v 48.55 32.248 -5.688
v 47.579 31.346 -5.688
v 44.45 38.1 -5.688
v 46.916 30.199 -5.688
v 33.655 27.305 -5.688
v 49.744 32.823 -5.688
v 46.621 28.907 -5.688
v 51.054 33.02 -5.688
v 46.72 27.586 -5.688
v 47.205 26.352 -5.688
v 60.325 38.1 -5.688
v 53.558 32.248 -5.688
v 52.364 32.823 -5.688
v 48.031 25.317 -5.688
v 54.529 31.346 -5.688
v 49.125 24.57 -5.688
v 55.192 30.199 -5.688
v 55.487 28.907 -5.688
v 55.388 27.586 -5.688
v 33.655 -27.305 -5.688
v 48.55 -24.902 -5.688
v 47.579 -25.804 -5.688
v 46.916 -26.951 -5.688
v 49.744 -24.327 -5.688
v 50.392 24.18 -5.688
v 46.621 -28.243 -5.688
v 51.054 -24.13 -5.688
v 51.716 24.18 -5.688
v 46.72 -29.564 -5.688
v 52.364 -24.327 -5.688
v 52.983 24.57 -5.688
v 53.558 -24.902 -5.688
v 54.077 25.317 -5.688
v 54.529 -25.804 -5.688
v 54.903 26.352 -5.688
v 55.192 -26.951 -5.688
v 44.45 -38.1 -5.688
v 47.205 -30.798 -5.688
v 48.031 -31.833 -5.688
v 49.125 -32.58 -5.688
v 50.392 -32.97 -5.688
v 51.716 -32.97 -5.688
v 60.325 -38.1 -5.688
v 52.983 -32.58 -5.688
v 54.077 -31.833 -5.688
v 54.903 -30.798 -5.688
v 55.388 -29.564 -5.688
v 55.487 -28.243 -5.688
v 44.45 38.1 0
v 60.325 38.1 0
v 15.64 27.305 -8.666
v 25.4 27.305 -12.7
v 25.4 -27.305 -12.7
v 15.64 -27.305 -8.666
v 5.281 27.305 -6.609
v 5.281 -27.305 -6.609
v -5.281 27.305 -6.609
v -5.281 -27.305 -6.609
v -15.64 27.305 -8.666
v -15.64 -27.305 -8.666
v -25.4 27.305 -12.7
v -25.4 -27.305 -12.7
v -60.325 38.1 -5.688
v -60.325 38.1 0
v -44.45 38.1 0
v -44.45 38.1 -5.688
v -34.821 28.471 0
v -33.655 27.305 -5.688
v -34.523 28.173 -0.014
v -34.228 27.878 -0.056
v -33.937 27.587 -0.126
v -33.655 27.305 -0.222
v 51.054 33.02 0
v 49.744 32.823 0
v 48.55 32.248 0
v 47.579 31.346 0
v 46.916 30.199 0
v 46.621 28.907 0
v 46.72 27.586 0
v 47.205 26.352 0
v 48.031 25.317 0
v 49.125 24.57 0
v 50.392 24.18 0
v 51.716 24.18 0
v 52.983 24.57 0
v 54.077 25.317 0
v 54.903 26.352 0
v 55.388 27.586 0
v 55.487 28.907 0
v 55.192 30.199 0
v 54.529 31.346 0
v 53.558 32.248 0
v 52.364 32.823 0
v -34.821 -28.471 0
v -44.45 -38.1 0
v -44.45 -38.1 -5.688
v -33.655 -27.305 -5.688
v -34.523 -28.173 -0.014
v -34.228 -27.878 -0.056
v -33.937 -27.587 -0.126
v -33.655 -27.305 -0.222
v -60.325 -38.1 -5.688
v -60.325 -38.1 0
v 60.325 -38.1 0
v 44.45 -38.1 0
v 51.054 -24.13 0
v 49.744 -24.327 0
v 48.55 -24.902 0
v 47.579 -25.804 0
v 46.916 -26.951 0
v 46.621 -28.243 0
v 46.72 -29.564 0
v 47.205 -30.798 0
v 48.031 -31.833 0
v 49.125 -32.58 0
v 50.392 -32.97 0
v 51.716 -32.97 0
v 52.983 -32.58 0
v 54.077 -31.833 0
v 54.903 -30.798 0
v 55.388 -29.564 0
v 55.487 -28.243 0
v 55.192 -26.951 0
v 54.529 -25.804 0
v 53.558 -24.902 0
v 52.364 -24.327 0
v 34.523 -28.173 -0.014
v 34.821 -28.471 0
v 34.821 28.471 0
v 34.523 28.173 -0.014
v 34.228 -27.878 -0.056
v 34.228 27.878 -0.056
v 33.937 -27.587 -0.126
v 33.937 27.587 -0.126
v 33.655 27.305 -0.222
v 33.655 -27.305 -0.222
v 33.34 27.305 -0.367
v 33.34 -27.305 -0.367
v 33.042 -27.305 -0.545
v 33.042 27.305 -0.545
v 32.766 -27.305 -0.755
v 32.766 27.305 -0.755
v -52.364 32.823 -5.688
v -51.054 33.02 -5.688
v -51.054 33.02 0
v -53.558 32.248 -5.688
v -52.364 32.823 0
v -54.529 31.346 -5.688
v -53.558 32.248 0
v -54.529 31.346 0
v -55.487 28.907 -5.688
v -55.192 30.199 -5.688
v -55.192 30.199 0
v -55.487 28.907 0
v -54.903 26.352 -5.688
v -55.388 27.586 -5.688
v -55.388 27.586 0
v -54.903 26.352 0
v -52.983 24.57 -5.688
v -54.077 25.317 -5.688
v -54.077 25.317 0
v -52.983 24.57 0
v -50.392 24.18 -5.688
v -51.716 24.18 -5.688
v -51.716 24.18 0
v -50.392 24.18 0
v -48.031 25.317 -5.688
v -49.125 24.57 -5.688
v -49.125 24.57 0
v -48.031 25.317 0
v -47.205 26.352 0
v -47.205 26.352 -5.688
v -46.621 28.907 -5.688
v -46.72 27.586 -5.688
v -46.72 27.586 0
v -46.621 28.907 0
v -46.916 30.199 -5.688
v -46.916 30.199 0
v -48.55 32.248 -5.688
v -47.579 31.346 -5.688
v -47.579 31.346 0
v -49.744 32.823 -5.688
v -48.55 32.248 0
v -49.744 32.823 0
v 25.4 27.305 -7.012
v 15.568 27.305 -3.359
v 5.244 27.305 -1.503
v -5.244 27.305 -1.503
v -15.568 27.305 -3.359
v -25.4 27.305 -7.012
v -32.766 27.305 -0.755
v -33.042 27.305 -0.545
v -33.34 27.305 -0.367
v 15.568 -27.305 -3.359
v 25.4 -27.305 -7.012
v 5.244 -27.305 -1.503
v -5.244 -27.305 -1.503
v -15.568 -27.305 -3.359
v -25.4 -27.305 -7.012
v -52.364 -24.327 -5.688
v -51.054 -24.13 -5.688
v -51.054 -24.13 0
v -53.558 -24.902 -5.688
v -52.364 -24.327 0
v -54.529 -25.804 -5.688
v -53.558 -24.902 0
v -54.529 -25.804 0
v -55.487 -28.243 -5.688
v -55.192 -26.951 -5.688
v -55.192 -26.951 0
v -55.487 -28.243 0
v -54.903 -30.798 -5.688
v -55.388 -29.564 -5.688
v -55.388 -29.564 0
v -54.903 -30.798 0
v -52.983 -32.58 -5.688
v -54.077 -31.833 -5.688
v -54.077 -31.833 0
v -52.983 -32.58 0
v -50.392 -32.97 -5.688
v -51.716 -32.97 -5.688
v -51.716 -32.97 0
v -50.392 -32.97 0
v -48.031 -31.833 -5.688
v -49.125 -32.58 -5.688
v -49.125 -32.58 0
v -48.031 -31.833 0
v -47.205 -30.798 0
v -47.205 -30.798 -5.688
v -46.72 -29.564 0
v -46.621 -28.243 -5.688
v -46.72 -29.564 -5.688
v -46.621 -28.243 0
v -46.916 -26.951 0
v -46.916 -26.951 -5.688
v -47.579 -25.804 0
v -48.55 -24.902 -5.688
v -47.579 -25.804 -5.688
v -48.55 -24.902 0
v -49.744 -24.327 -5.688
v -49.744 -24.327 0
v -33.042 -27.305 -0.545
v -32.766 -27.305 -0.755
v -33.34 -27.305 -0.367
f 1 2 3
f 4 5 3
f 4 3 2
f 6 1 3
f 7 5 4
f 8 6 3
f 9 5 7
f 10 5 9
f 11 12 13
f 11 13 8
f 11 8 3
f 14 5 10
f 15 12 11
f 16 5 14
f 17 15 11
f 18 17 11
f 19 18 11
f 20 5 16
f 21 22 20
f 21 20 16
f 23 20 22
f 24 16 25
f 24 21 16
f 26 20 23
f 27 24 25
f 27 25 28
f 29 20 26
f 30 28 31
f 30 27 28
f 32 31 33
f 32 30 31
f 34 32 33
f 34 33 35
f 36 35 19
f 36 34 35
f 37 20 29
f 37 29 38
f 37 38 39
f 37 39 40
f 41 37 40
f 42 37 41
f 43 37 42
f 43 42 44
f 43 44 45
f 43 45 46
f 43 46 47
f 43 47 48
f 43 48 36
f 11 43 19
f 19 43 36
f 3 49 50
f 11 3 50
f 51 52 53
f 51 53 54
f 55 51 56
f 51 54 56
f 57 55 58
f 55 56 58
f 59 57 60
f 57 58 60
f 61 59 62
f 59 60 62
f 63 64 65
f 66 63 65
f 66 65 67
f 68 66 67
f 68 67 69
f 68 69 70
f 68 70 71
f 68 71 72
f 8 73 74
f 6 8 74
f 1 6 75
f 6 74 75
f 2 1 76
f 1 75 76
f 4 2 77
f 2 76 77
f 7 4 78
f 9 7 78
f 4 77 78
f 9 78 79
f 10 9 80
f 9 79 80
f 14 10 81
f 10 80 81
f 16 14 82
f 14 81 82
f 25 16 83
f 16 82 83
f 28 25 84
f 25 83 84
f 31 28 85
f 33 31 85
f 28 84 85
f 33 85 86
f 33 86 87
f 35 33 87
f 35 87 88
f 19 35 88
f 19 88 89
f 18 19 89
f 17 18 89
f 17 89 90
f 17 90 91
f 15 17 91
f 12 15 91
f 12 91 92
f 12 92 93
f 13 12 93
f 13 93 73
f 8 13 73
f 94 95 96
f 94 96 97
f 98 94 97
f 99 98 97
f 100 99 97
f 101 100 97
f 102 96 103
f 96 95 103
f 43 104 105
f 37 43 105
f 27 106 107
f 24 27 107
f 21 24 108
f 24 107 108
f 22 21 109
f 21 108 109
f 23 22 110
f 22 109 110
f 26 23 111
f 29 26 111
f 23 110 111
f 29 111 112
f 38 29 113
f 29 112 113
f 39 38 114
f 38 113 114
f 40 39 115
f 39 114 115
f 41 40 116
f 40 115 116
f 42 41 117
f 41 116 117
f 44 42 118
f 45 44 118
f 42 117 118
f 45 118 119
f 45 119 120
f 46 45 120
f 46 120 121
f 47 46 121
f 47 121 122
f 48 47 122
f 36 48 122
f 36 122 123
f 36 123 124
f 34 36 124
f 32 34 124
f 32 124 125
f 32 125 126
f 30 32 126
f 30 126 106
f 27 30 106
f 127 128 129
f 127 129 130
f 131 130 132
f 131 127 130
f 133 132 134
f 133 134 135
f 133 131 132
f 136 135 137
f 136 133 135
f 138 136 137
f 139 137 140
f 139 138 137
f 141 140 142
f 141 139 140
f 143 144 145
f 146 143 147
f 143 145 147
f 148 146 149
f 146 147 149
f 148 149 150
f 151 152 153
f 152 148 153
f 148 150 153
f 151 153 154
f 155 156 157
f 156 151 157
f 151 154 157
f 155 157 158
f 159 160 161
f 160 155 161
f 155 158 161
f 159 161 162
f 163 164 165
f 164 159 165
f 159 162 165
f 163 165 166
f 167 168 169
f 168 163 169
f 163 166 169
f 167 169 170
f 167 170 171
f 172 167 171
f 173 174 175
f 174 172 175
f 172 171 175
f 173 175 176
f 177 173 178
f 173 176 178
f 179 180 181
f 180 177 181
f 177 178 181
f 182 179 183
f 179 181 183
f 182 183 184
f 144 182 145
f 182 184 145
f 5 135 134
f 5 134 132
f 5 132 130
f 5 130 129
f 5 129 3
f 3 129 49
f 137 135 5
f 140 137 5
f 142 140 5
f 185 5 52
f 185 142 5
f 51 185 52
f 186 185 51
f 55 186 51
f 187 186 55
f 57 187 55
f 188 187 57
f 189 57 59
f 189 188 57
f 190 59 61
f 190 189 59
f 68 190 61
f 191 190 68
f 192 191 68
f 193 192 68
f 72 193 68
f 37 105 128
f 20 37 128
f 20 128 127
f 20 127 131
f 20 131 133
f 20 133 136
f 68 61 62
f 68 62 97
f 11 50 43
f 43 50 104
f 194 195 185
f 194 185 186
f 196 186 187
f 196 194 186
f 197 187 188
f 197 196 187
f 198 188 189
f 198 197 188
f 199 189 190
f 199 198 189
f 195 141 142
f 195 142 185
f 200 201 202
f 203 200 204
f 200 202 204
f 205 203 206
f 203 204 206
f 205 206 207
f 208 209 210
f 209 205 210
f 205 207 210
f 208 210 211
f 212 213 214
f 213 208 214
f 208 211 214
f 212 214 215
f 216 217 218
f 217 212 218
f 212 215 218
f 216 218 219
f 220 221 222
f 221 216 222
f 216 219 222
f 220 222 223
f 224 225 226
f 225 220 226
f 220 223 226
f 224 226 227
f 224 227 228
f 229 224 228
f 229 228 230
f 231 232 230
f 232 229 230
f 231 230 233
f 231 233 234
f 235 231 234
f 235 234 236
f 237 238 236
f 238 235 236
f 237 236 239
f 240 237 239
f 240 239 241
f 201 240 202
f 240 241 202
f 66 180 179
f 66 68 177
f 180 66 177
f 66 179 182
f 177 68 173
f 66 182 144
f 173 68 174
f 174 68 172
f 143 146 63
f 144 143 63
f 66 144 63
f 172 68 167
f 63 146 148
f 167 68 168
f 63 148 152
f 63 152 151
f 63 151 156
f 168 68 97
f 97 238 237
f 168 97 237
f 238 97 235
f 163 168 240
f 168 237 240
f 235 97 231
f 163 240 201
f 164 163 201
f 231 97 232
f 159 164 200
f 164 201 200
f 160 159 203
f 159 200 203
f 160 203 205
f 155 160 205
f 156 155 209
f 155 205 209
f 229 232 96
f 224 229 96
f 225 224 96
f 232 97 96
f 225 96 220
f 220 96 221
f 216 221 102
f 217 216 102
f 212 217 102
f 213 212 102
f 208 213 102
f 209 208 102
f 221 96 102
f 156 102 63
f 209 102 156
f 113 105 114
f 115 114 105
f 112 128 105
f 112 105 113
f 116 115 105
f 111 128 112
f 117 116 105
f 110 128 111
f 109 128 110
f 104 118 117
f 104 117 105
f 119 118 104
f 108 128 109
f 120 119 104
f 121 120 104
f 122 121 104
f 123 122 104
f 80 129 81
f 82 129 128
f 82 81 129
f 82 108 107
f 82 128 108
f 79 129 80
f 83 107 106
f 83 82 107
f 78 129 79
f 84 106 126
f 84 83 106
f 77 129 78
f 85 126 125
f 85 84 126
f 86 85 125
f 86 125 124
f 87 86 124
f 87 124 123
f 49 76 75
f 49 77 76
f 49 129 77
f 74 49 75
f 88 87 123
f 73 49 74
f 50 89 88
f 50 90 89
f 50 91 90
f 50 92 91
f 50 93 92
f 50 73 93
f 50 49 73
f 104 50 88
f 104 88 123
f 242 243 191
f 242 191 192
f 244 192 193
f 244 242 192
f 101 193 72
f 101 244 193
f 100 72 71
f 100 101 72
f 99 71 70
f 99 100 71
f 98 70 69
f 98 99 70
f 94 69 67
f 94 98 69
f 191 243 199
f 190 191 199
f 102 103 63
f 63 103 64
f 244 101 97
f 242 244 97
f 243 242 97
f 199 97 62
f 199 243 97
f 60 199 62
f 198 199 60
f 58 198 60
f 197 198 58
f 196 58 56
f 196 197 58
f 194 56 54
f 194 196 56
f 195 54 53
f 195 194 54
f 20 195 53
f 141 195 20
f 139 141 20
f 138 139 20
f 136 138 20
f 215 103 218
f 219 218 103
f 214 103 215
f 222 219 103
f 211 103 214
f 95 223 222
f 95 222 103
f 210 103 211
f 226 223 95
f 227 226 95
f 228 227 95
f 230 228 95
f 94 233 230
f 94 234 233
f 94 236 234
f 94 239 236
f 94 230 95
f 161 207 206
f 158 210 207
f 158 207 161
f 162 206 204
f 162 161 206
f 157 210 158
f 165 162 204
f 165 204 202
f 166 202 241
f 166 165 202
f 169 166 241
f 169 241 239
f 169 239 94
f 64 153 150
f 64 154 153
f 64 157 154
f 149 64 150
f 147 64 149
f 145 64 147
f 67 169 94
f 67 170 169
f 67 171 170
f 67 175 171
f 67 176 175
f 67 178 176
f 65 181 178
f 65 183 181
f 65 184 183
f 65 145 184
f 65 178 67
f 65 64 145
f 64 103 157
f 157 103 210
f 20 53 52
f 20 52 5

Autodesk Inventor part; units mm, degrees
ref_plane "YZ Plane" through (0, 0, 0) normal (1, 0, 0) x (0, 1, 0)
ref_plane "XZ Plane" through (0, 0, 0) normal (0, 1, 0) x (-1, 0, 0)
ref_plane "XY Plane" through (0, 0, 0) normal (0, 0, 1) x (1, 0, 0)
sketch "Sketch1" plane through (0, 0, 0) normal (0, 0, 1) x (1, 0, 0)
  line L0 (-84.455, 0) -> (84.455, 0) projected
  line L1 (0, -53.34) -> (0, 53.34) projected
  line L2 (60.325, 38.1) -> (60.325, -38.1)
  line L3 (-60.325, -38.1) -> (-60.325, 38.1)
  line L4 (44.45, 38.1) -> (44.45, -38.1) construction
  line L5 (-44.45, -38.1) -> (-44.45, 38.1) construction
  line L6 (-33.655, -27.305) -> (33.655, -27.305)
  line L7 (-44.45, 38.1) -> (-33.655, 27.305)
  line L8 (-60.325, 38.1) -> (-44.45, 38.1)
  line L9 (44.45, 38.1) -> (60.325, 38.1)
  line L10 (33.655, 27.305) -> (-33.655, 27.305)
  line L11 (33.655, 27.305) -> (44.45, 38.1)
  line L12 (-44.45, -38.1) -> (-33.655, -27.305)
  line L13 (44.45, -38.1) -> (33.655, -27.305)
  line L14 (60.325, -38.1) -> (44.45, -38.1)
  line L15 (-44.45, -38.1) -> (-60.325, -38.1)
  point P0 (0, 0)
  point P1 (-60.325, 0)
  point P2 (0, 27.305)
  dimension "d1" = 76.2
  dimension "d2" = 15.875
  dimension "d4" = 45
  dimension "d5" = 54.61
  dimension "d6" = 120.65
  dimension "d7" = 15.875
  dimension "d8" = 45
  dimension "d9" = 10.795
extrude "Extrusion1" add sketch "Sketch1" against normal blind 12.7
sketch "Sketch2" plane through (-33.655, 27.305, 0) normal (0, 1, 0) x (1, 0, 0)
  line L0 (67.31, 12.7) -> (0, 12.7) projected
  line L1 (67.31, 0) -> (67.31, 12.7) projected
  line L2 (0, 12.7) -> (-10.795, 12.7) projected
  line L3 (-10.795, 0) -> (-10.795, 12.7) projected
  line L4 (0, 0) -> (-10.795, 0) projected
  line L5 (0, 0) -> (0, 12.7) projected
  line L6 (-10.795, 12.7) -> (-26.67, 12.7) projected
  line L7 (-26.67, 0) -> (-26.67, 12.7) projected
  line L8 (-10.795, 0) -> (-26.67, 0) projected
  line L9 (-10.795, 0) -> (-10.795, 12.7) projected
  line L10 (-10.795, 12.7) -> (-26.67, 12.7) projected
  line L11 (-26.67, 0) -> (-26.67, 12.7) projected
  line L12 (-10.795, 0) -> (-10.795, 12.7) projected
  line L13 (93.98, 0) -> (78.105, 0) projected
  line L14 (78.105, 0) -> (67.31, 0) projected
  line L15 (78.105, 0) -> (78.105, 12.7) projected
  line L16 (78.105, 12.7) -> (67.31, 12.7) projected
  line L17 (93.98, 12.7) -> (78.105, 12.7) projected
  line L18 (93.98, 12.7) -> (78.105, 12.7) projected
  line L19 (78.105, 0) -> (78.105, 12.7) projected
  line L20 (93.98, 0) -> (78.105, 0) projected
  line L21 (93.98, 0) -> (93.98, 12.7) projected
  line L22 (33.655, 0) -> (33.655, 12.7) construction
  line L23 (59.055, 0) -> (59.055, 12.7) construction
  line L24 (8.255, 0.2933) -> (8.255, 12.9933) construction
  arc A0 (8.255, 7.0115) -> (59.055, 7.0115) centre (33.655, 60.325) ccw
  arc A1 (8.255, 12.7) -> (59.055, 12.7) centre (33.655, 60.325) ccw
  line L25 (66.421, 0.7551) -> (59.055, 7.0115)
  line L26 (59.055, 12.7) -> (67.31, 5.6885)
  line L27 (68.4764, 0) -> (93.98, 0)
  arc A2 (66.421, 0.7551) -> (68.4764, 0) centre (68.4764, 3.175) ccw
  line L28 (67.31, 5.6885) -> (93.98, 5.6885)
  line L29 (93.98, 0) -> (93.98, 5.6885)
  line L30 (0.889, 0.7551) -> (8.255, 7.0115)
  line L31 (8.255, 12.7) -> (0, 5.6885)
  line L32 (-1.1664, 0) -> (-26.67, 0)
  line L33 (0, 5.6885) -> (-26.67, 5.6885)
  line L34 (-26.67, 0) -> (-26.67, 5.6885)
  arc A3 (-1.1664, 0) -> (0.889, 0.7551) centre (-1.1664, 3.175) ccw
  dimension "d12" = 50.8
  dimension "d13" = 53.975
  dimension "d14" = 5.08
  dimension "d15" = 3.175
  dimension "d17" = 3.175
extrude "Extrusion2" cut sketch "Sketch2" along normal through all both and the other way through all contours L26 L1 A2 L25 A0 L30 A3 L5 L31 A1 | L28 L15 L14 A2 L1 | L28 L21 L13 L15 | L5 A3 L4 L3 L33 | L3 L8 L7 L33 keep common part
sketch "Sketch3" plane through (60.325, 38.1, -5.6885) normal (0, 0, -1) x (-1, 0, 0)
  line L0 (0, 0) -> (0, -76.2) projected
  line L1 (26.67, -65.405) -> (26.67, -10.795) projected
  line L2 (0, -38.1) -> (26.67, -38.1) construction
  point P0 (60.325, -38.1)
  point P1 (9.271, -9.525)
  point P2 (9.271, -66.675)
  dimension "d20" = 57.15
  dimension "d21" = 9.271
hole "Hole1" at (51.054, 28.575, -5.6885) at (51.054, -28.575, -5.6885) direction (0, 0, 1) diameter 8.89 end through all
mirror "Mirror1" about plane through (0, 0, 0) normal (1, 0, 0) of "Hole1"
equation "\"d9\" = -0.5 * d5 + 0.5 * d1"
properties part number "mount plate" material "Steel"
